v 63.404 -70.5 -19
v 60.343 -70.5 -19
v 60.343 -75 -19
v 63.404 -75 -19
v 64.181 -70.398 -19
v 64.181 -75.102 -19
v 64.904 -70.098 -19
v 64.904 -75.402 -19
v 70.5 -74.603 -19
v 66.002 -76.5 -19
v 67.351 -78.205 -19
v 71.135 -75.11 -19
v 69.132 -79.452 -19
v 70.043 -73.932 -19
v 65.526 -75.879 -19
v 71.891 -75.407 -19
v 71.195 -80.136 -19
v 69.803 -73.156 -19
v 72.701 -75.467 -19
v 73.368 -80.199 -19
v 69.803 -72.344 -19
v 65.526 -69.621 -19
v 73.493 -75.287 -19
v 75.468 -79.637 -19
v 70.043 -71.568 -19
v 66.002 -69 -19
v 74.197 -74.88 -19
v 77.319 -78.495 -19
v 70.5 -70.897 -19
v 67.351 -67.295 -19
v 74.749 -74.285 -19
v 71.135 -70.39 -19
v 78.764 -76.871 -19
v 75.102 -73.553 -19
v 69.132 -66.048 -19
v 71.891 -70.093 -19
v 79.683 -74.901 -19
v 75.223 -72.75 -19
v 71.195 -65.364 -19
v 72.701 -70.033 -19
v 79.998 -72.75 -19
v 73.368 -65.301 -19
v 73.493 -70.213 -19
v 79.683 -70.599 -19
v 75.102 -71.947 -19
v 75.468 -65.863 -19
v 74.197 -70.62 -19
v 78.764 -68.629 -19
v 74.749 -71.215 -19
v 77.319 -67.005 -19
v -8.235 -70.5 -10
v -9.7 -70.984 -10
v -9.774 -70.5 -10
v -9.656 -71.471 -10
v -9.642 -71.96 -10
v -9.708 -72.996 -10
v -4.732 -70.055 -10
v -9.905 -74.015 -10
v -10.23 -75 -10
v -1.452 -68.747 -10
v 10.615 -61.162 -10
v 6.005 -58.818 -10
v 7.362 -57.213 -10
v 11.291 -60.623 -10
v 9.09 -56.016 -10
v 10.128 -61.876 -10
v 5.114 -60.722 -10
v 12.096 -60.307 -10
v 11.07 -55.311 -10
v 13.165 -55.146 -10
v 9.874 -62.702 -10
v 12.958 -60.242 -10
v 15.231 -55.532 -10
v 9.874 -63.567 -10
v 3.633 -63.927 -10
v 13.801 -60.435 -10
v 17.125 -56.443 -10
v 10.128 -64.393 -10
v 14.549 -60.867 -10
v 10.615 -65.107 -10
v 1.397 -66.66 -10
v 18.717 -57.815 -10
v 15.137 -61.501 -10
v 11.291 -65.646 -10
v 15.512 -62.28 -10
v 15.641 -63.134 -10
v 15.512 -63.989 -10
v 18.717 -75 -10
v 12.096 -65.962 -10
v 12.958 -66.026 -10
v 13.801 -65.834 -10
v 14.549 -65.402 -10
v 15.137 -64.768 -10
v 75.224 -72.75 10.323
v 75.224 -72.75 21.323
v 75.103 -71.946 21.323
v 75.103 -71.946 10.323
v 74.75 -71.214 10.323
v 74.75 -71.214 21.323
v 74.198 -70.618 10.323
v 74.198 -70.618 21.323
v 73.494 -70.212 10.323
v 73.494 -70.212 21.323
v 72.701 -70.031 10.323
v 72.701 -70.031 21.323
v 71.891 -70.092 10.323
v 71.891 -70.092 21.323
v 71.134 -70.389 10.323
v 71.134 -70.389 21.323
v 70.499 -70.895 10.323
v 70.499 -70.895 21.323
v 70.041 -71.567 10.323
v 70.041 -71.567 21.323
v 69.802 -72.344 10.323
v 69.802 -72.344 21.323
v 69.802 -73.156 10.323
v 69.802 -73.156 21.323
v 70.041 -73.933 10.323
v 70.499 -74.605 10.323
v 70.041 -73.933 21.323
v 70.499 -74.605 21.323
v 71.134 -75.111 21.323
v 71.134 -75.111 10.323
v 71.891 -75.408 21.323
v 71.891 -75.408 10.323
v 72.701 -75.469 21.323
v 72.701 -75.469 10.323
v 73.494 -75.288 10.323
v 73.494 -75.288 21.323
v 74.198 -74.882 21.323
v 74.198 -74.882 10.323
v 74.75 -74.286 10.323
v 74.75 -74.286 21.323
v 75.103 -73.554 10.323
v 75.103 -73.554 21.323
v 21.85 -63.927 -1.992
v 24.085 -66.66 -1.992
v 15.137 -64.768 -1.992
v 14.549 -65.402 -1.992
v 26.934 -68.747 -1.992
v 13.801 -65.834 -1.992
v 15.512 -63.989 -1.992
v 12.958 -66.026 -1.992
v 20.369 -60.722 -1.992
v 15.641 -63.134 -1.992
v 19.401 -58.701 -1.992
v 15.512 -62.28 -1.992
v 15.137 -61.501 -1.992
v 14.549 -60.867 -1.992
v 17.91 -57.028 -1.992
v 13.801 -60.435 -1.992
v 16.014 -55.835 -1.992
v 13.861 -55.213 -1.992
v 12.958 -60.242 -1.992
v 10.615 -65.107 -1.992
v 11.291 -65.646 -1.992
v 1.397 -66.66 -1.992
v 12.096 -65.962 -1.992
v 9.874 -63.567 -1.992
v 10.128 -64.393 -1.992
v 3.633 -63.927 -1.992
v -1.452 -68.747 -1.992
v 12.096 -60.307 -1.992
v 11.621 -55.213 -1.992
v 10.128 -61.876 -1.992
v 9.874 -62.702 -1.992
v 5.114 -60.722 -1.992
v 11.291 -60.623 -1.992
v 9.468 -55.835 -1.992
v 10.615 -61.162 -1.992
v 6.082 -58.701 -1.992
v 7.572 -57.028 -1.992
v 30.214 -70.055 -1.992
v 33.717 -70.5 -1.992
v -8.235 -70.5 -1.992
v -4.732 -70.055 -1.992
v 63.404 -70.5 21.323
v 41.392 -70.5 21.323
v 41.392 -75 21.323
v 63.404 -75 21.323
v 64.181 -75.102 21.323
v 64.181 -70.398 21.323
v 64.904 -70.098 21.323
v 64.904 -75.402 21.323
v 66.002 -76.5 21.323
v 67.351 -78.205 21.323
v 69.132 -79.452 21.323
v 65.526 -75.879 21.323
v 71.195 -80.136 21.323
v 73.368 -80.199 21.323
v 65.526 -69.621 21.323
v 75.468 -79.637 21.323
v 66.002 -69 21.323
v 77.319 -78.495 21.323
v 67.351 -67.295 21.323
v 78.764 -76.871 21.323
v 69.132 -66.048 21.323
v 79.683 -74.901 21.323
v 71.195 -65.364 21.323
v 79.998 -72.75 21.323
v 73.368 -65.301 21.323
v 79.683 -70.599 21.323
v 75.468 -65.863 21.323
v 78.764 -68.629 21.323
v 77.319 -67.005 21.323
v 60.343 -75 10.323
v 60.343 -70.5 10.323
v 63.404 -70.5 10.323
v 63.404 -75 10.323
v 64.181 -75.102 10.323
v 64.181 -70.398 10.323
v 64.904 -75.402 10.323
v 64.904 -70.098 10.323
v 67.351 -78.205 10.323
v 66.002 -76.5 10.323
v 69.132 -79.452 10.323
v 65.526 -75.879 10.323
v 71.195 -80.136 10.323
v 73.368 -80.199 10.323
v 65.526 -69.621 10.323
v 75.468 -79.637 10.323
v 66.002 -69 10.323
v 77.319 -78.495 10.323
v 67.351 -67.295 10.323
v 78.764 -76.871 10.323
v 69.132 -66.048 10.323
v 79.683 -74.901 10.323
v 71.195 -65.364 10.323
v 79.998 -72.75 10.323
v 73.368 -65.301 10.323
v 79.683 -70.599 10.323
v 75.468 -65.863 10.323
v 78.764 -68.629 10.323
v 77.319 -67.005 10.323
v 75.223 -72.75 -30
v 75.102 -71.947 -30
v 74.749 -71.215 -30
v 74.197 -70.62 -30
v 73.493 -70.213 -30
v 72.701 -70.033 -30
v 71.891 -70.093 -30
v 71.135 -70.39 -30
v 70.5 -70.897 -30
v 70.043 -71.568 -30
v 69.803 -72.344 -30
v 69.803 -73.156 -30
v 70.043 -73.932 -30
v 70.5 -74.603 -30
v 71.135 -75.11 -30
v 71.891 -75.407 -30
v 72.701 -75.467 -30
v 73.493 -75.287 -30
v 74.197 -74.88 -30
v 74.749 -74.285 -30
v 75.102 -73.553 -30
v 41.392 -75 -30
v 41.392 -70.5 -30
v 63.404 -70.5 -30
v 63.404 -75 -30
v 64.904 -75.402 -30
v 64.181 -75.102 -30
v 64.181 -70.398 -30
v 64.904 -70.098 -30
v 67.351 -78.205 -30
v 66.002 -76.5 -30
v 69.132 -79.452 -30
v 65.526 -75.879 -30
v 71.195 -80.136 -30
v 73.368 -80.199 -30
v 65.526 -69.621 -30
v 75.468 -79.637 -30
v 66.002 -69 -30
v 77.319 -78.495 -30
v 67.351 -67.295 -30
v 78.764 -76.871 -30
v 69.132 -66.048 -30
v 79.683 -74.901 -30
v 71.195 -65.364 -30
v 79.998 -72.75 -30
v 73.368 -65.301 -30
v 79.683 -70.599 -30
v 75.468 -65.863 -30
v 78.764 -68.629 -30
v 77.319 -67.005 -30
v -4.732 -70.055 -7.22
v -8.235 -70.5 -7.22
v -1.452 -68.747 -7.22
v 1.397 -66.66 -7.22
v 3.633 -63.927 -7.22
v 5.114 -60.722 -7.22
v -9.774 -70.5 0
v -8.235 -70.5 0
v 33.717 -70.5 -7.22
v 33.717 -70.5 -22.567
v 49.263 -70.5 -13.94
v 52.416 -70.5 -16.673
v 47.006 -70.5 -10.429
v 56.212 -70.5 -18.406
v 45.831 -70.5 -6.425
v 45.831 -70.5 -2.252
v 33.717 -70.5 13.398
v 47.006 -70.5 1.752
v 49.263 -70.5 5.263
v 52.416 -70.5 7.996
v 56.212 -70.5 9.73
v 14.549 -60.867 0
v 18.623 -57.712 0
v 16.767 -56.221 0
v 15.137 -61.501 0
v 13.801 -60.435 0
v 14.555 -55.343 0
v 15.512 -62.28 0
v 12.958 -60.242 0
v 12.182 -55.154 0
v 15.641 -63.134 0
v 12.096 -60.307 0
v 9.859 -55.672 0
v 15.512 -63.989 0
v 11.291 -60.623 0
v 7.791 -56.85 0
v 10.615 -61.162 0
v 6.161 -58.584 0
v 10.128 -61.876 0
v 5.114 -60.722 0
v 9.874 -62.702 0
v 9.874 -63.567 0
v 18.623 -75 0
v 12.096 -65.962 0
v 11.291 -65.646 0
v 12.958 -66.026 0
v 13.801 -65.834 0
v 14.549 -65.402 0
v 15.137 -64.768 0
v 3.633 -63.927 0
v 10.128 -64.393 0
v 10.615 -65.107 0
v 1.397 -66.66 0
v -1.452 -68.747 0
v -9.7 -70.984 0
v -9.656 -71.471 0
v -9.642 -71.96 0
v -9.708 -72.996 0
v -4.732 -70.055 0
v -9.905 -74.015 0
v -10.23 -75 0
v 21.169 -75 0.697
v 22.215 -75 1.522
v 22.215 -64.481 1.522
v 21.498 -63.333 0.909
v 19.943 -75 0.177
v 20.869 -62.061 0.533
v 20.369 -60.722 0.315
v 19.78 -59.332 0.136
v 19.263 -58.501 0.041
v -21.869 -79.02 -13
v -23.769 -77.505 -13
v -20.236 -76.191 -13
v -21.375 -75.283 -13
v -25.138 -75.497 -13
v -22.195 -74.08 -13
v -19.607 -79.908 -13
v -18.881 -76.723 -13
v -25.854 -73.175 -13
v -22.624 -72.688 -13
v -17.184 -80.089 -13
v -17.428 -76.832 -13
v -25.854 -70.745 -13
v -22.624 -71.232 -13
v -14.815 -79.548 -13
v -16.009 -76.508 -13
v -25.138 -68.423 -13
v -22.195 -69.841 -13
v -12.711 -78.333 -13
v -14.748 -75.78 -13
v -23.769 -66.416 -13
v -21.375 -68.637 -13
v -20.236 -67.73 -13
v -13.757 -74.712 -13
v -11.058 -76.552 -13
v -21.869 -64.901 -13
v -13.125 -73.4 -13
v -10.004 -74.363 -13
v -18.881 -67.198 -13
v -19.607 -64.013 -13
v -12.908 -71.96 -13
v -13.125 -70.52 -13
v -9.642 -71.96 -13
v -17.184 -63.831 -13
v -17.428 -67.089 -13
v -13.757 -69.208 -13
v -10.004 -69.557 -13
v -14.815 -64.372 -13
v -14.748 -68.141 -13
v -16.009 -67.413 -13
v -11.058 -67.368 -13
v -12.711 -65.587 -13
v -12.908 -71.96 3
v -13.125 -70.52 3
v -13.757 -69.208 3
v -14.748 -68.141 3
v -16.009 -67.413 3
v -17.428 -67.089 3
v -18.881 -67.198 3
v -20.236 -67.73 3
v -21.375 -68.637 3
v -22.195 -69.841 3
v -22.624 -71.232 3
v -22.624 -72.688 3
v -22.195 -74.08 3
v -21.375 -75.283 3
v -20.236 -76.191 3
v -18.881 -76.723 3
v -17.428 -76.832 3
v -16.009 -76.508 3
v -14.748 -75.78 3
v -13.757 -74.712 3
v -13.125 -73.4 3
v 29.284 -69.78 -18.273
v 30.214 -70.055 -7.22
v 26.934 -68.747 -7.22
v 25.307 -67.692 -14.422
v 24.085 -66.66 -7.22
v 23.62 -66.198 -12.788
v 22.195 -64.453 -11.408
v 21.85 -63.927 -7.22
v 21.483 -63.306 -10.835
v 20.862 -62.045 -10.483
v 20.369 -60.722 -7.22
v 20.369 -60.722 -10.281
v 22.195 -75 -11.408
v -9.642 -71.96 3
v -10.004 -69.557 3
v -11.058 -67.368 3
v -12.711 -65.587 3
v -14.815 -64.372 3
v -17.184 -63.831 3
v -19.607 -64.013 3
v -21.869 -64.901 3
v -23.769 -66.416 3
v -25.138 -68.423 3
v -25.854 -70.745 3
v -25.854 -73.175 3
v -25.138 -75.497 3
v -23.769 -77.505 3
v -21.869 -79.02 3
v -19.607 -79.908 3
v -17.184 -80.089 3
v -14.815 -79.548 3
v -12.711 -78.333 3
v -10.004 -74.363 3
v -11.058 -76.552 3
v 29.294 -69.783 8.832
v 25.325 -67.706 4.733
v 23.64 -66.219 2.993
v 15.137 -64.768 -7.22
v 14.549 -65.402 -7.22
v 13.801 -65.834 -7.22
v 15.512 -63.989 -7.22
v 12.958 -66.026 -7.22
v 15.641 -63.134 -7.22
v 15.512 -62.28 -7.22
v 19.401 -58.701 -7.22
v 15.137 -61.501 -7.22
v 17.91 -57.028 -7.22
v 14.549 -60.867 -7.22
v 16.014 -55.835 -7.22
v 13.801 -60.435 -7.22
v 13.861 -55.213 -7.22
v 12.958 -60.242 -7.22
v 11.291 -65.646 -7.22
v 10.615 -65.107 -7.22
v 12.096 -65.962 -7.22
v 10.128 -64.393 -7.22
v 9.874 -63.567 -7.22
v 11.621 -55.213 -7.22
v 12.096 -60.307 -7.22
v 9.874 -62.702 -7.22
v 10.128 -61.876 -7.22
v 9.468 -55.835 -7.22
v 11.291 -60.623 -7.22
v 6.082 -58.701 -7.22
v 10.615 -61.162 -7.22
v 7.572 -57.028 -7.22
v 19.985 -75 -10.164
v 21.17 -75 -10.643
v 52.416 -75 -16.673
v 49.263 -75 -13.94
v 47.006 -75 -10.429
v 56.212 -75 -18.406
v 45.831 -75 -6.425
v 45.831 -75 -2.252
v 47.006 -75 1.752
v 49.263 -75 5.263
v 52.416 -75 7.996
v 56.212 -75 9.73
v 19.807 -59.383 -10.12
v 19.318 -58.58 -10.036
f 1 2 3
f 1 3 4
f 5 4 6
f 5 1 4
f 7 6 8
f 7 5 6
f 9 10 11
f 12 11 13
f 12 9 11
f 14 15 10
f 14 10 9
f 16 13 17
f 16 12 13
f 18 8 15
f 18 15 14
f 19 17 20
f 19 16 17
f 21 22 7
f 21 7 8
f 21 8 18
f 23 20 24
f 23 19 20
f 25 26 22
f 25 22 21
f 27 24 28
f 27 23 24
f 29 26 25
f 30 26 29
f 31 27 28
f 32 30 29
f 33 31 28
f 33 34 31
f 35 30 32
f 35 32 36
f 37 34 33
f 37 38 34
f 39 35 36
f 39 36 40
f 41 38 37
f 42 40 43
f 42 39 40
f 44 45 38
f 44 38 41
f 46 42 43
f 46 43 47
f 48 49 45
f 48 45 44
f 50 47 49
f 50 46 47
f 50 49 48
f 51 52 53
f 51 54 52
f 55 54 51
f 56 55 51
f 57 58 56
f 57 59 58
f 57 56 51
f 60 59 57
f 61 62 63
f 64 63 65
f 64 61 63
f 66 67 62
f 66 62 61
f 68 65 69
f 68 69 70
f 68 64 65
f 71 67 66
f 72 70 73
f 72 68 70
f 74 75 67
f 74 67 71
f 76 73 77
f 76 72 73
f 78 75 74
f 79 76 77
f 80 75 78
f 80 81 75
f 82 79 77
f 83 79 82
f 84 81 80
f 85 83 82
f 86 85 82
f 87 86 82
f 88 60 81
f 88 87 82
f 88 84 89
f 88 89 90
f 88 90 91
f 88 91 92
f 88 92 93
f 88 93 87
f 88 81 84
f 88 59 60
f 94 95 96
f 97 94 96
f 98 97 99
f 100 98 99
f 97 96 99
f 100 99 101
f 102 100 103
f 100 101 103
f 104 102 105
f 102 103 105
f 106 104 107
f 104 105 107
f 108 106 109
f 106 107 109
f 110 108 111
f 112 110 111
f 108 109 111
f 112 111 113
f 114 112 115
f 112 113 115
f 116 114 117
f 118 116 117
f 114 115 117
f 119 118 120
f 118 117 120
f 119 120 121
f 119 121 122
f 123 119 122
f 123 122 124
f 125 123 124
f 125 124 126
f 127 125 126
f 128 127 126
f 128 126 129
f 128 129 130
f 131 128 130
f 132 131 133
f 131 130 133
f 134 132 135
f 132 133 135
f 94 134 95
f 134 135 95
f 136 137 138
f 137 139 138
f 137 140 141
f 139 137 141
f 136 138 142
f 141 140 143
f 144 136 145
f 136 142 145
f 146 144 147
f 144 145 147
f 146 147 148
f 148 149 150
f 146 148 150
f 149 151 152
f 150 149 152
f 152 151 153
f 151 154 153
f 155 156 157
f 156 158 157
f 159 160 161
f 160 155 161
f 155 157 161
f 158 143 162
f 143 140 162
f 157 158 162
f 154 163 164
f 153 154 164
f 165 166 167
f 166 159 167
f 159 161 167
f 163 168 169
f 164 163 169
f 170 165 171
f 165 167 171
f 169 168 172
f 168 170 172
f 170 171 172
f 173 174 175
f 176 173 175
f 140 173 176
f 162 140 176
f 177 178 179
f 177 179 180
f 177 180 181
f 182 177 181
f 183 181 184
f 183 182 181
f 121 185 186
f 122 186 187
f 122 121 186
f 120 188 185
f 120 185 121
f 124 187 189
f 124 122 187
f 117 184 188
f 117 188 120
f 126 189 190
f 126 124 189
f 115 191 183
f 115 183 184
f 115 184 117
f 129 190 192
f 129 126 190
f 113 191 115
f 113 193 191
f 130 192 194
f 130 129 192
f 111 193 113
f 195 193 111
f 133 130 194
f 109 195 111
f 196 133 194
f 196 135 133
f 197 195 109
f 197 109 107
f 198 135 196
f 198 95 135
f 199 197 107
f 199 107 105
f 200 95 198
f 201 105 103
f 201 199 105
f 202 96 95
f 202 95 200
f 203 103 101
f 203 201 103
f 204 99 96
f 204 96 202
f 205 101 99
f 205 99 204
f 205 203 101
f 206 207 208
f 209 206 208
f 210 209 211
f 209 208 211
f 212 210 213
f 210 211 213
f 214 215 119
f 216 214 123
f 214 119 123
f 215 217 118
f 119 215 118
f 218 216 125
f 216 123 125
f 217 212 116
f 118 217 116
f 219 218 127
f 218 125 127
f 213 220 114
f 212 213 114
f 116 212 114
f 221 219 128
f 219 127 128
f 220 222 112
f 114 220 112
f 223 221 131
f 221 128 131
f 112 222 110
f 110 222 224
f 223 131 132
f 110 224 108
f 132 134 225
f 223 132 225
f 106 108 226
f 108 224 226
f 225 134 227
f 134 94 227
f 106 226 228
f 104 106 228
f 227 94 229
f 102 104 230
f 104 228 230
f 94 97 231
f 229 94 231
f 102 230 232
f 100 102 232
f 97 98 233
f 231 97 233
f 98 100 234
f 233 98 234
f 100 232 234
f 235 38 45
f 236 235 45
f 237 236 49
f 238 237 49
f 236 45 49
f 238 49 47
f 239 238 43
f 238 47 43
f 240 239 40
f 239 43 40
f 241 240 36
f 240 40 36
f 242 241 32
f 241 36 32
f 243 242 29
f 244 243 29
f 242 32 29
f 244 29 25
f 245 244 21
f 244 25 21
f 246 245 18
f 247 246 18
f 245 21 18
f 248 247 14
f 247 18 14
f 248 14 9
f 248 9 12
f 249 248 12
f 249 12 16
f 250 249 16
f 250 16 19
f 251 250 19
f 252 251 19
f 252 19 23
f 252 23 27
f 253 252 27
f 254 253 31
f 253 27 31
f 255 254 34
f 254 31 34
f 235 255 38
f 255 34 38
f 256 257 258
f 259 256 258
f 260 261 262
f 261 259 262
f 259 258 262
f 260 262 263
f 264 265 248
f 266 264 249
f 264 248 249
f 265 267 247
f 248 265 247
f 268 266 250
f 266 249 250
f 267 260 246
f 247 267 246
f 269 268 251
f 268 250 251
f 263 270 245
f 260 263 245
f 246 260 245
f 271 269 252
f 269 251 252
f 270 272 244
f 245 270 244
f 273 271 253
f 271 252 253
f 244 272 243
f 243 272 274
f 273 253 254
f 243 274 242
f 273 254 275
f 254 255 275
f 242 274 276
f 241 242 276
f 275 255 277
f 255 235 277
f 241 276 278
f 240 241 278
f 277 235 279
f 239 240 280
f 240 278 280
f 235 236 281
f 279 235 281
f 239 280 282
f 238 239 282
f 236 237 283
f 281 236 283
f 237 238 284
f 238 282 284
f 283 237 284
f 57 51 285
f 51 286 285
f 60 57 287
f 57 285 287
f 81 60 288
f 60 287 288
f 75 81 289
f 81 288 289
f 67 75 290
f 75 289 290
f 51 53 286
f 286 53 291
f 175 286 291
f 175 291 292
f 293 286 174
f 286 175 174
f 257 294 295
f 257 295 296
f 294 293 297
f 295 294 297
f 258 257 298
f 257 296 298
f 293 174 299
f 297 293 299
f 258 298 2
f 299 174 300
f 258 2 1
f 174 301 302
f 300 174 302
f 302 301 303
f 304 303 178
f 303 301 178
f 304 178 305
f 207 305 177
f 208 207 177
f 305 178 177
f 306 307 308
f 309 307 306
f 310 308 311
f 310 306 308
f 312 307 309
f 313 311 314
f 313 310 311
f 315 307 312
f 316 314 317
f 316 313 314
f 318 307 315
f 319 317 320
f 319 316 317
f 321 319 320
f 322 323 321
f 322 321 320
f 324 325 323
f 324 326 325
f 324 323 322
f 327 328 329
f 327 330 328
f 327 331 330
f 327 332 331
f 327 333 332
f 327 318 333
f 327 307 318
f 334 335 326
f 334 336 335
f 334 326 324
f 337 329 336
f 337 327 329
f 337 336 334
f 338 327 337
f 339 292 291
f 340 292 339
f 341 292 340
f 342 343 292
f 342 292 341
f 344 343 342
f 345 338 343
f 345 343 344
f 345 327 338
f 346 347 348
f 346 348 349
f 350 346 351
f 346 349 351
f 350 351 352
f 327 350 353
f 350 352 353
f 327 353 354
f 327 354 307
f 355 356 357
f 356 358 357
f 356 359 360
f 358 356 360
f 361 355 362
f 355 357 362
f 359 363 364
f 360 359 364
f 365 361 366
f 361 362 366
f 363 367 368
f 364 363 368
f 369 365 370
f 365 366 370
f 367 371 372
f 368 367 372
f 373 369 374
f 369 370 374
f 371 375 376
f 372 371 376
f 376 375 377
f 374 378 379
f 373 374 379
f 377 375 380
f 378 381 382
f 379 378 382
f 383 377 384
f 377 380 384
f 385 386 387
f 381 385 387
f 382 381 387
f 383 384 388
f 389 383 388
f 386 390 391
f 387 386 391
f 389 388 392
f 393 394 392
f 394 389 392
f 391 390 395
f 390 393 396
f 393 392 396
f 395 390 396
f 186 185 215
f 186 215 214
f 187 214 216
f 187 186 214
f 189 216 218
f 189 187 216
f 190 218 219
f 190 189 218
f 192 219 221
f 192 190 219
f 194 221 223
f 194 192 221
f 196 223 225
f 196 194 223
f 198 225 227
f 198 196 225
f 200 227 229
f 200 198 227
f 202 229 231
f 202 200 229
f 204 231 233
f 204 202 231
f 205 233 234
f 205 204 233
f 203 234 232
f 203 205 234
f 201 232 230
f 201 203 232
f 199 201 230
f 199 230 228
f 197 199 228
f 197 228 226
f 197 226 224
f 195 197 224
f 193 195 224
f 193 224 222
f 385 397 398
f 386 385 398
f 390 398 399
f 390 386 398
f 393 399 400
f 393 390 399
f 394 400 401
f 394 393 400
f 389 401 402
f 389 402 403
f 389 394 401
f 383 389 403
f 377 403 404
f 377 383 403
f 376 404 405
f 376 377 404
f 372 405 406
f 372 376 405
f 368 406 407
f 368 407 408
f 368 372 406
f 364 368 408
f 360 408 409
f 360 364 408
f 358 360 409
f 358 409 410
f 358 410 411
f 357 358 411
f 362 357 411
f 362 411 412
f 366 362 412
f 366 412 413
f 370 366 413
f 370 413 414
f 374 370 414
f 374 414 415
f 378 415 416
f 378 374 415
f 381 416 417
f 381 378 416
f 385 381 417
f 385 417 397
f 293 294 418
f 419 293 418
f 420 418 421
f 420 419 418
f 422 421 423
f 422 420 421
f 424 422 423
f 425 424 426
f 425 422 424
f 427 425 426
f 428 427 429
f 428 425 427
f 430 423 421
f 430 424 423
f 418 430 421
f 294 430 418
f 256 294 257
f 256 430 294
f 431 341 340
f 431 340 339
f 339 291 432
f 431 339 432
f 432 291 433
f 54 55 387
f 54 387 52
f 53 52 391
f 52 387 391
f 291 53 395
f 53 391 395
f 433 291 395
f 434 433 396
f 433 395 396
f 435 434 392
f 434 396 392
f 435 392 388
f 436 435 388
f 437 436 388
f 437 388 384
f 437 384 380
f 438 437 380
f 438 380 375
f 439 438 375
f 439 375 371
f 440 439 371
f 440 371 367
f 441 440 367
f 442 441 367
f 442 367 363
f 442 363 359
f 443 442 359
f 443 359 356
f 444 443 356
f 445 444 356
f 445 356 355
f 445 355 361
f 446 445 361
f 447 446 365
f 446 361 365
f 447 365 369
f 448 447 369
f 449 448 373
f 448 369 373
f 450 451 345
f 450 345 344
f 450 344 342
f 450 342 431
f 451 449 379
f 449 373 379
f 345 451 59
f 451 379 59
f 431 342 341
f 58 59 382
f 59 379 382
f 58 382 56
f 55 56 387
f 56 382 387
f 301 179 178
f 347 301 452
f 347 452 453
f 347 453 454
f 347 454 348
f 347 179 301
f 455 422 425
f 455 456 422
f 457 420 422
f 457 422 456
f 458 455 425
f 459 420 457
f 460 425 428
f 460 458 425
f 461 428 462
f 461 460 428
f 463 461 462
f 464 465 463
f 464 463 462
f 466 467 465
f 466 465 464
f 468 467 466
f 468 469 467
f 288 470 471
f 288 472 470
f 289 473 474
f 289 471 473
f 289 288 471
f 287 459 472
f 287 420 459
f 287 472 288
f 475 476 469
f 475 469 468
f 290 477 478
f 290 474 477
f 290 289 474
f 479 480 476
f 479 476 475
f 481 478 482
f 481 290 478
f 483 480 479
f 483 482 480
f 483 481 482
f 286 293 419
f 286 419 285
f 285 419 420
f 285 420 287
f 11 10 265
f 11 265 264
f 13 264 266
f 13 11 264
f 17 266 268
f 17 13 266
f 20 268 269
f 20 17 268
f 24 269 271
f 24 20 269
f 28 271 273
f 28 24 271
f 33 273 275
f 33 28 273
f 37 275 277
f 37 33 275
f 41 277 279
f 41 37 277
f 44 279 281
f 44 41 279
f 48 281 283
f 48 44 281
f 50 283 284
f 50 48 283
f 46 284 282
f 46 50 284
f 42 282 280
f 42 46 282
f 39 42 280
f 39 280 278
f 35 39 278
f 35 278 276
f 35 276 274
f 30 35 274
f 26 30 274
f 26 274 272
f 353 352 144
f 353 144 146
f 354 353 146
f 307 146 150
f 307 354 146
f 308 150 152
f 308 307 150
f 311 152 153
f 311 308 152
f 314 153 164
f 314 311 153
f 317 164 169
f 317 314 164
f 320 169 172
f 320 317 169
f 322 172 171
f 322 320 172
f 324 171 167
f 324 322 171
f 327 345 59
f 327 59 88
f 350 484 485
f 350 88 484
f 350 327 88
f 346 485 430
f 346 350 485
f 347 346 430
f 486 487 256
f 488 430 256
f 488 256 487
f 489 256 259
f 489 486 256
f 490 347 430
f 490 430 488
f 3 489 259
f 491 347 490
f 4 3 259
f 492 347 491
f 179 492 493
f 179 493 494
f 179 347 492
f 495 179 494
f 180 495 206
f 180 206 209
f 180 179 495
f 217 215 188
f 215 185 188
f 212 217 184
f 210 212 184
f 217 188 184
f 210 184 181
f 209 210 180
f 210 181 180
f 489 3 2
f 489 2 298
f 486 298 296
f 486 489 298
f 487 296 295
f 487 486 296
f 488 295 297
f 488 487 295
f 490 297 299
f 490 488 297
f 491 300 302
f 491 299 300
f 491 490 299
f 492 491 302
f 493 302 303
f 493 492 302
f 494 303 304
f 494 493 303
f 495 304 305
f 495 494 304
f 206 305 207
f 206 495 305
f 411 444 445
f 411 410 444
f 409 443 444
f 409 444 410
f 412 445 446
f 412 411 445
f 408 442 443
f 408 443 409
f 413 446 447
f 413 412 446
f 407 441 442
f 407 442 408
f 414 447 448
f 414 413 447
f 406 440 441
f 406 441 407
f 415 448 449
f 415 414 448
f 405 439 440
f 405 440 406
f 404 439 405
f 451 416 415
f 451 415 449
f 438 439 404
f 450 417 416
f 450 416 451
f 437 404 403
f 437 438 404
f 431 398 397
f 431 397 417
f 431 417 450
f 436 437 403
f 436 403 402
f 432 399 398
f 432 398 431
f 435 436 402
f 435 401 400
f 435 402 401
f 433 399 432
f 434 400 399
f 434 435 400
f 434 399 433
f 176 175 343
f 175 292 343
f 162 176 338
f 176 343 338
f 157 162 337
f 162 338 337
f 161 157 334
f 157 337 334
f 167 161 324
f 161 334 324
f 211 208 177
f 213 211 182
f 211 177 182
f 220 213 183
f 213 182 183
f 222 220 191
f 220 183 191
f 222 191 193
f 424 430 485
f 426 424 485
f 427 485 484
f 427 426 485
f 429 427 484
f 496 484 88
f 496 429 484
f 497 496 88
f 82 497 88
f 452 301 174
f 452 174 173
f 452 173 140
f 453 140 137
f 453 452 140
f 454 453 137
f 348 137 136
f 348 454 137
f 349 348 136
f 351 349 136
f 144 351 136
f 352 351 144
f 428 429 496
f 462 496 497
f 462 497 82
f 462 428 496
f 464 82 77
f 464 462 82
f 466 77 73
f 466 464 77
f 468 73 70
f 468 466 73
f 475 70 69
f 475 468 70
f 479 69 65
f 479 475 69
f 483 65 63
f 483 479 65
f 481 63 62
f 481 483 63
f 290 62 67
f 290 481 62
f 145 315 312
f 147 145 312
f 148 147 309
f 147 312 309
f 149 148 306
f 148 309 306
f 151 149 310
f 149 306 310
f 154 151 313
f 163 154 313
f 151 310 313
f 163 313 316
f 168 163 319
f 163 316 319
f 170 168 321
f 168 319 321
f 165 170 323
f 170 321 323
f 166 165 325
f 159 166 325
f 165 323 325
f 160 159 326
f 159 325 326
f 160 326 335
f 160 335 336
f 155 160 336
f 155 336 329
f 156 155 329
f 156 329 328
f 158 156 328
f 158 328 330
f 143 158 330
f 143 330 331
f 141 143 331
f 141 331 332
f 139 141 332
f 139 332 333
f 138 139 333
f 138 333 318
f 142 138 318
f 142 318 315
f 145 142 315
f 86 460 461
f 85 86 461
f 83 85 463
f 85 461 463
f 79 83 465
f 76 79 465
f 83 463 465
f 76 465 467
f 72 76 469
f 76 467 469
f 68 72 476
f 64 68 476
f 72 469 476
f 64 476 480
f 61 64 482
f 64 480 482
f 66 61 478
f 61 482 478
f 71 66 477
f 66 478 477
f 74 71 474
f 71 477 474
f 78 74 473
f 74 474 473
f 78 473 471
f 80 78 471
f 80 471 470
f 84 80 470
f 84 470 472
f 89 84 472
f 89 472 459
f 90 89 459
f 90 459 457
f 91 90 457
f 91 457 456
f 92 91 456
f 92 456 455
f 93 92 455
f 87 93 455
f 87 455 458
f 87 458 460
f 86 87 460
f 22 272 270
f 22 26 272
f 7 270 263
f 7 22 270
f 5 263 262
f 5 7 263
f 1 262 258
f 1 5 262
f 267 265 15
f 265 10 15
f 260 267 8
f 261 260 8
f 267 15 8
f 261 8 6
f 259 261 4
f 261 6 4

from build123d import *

# Parameters (mm, degrees)
SKETCH1_R           = 8
SKETCH1_R_2         = 2.9
EXTRUDE1_DEPTH      = 10
EXTRUDE2_DEPTH      = 0.5
EXTRUDE2_DEPTH_BACK = 4
SKETCH4_W           = 5.227994408
SKETCH4_H           = 18.151774592
CUT_EXTRUDE1_DEPTH  = 104.897653244
FILLET4_R           = 14
SKETCH6_R           = 7.5
SKETCH6_R_2         = 2.726604726
EXTRUDE4_DEPTH      = 11
EXTRUDE6_DEPTH      = 3
EXTRUDE6_DEPTH_BACK = 13
SKETCH11_R          = 8.15177363
SKETCH11_R_2        = 4.885123956
EXTRUDE7_START      = 11
SKETCH8_R           = 7.5
SKETCH8_R_2         = 2.725
EXTRUDE7_DEPTH      = 11
FILLET19_R          = 3
FILLET23_R          = 5


with BuildPart() as part:
    # Sketch1 → Extrude1 (new body)
    with BuildSketch(Plane.XY):
        with Locations((12.741128877, -63.13435232)):
            Circle(SKETCH1_R)
        with Locations((12.741128877, -63.13435232)):
            Circle(SKETCH1_R_2, mode=Mode.SUBTRACT)
    extrude(amount=-EXTRUDE1_DEPTH)

    # Sketch2 → Extrude2 (add, two sides: drawn at the far end of the back side and taken through both)
    with BuildSketch(Plane(origin=(0, -71, 0), x_dir=(-1, 0, 0), z_dir=(0, 1, 0)).offset(-EXTRUDE2_DEPTH_BACK)):
        with BuildLine():
            Line((-12.741128877, 0), (12.908426363, 0))
            Line((12.908426363, 0), (12.908426363, -10))
            Line((12.908426363, -10), (-12.741128877, -10))
            Line((-12.741128877, -10), (-20.741128877, -10))
            Line((-20.741128877, -10), (-41.392249983, -30))
            Line((-41.392249983, -30), (-65.343112489, -30))
            Line((-65.343112489, -30), (-65.343112489, -19))
            Line((-65.343112489, -19), (-60.343112489, -19))
            ThreePointArc((-60.343112489, -19), (-45.681392415, -4.338279927), (-60.343112489, 10.323440147))
            Line((-60.343112489, 10.323440147), (-65.343112489, 10.323440147))
            Line((-65.343112489, 10.323440147), (-65.343112489, 21.323440147))
            Line((-65.343112489, 21.323440147), (-41.392249983, 21.323440147))
            Line((-41.392249983, 21.323440147), (-20.741128877, 0))
            Line((-20.741128877, 0), (-12.741128877, 0))
        make_face()
    extrude(amount=EXTRUDE2_DEPTH + EXTRUDE2_DEPTH_BACK)

    # Sketch4 → Cut-Extrude1 (cut, through all)
    with BuildSketch(Plane(origin=(0, 0, 0), x_dir=(0, 0, -1), z_dir=(1, 0, 0))):
        with Locations((4.605888128, -61.424112704)):
            Rectangle(SKETCH4_W, SKETCH4_H)
    extrude(amount=CUT_EXTRUDE1_DEPTH, mode=Mode.SUBTRACT)

    # Fillet4
    fillet4_edges = [part.edges().sort_by_distance(p)[0] for p in [
        (9.619072783, -70.5, -0.995945462),
        (15.863184971, -70.5, -8.609942666),
        (15.863184971, -70.5, -0.995945462),
        (9.619072783, -70.5, -8.609942666),
    ]]
    fillet(fillet4_edges, radius=FILLET4_R)

    # Sketch6 → Extrude4 (add)
    with BuildSketch(Plane.XY.offset(21.323440147)):
        with Locations((72.497656499, -72.75)):
            Circle(SKETCH6_R)
        with Locations((72.497656499, -72.75)):
            Circle(SKETCH6_R_2, mode=Mode.SUBTRACT)
    extrude(amount=-EXTRUDE4_DEPTH)

    # Sketch11 → Extrude6 (add, two sides: drawn at the far end of the back side and taken through both)
    with BuildSketch(Plane.XY.offset(-EXTRUDE6_DEPTH_BACK)):
        with Locations((-17.793550319, -71.960171152)):
            Circle(SKETCH11_R)
        with Locations((-17.793550319, -71.960171152)):
            Circle(SKETCH11_R_2, mode=Mode.SUBTRACT)
    extrude(amount=EXTRUDE6_DEPTH + EXTRUDE6_DEPTH_BACK)

    # Sketch8 → Extrude7 (add)
    with BuildSketch(Plane.XY.offset(-30).offset(EXTRUDE7_START)):
        with Locations((72.497656499, -72.75)):
            Circle(SKETCH8_R)
        with Locations((72.497656499, -72.75)):
            Circle(SKETCH8_R_2, mode=Mode.SUBTRACT)
    extrude(amount=-EXTRUDE7_DEPTH)

    # Fillet19
    fillet19_edges = [part.edges().sort_by_distance(p)[0] for p in [
        (65.343112489, -75, 15.823440147),
        (65.343112489, -75, -24.5),
        (65.343112489, -70.5, 15.823440147),
        (65.343112489, -70.5, -24.5),
    ]]
    fillet(fillet19_edges, radius=FILLET19_R)

    # Fillet23
    fillet23_edges = [part.edges().sort_by_distance(p)[0] for p in [
        (20.741128877, -68.378111591, -10),
        (20.741128877, -68.378111591, 0),
    ]]
    fillet(fillet23_edges, radius=FILLET23_R)


solid = part.part
